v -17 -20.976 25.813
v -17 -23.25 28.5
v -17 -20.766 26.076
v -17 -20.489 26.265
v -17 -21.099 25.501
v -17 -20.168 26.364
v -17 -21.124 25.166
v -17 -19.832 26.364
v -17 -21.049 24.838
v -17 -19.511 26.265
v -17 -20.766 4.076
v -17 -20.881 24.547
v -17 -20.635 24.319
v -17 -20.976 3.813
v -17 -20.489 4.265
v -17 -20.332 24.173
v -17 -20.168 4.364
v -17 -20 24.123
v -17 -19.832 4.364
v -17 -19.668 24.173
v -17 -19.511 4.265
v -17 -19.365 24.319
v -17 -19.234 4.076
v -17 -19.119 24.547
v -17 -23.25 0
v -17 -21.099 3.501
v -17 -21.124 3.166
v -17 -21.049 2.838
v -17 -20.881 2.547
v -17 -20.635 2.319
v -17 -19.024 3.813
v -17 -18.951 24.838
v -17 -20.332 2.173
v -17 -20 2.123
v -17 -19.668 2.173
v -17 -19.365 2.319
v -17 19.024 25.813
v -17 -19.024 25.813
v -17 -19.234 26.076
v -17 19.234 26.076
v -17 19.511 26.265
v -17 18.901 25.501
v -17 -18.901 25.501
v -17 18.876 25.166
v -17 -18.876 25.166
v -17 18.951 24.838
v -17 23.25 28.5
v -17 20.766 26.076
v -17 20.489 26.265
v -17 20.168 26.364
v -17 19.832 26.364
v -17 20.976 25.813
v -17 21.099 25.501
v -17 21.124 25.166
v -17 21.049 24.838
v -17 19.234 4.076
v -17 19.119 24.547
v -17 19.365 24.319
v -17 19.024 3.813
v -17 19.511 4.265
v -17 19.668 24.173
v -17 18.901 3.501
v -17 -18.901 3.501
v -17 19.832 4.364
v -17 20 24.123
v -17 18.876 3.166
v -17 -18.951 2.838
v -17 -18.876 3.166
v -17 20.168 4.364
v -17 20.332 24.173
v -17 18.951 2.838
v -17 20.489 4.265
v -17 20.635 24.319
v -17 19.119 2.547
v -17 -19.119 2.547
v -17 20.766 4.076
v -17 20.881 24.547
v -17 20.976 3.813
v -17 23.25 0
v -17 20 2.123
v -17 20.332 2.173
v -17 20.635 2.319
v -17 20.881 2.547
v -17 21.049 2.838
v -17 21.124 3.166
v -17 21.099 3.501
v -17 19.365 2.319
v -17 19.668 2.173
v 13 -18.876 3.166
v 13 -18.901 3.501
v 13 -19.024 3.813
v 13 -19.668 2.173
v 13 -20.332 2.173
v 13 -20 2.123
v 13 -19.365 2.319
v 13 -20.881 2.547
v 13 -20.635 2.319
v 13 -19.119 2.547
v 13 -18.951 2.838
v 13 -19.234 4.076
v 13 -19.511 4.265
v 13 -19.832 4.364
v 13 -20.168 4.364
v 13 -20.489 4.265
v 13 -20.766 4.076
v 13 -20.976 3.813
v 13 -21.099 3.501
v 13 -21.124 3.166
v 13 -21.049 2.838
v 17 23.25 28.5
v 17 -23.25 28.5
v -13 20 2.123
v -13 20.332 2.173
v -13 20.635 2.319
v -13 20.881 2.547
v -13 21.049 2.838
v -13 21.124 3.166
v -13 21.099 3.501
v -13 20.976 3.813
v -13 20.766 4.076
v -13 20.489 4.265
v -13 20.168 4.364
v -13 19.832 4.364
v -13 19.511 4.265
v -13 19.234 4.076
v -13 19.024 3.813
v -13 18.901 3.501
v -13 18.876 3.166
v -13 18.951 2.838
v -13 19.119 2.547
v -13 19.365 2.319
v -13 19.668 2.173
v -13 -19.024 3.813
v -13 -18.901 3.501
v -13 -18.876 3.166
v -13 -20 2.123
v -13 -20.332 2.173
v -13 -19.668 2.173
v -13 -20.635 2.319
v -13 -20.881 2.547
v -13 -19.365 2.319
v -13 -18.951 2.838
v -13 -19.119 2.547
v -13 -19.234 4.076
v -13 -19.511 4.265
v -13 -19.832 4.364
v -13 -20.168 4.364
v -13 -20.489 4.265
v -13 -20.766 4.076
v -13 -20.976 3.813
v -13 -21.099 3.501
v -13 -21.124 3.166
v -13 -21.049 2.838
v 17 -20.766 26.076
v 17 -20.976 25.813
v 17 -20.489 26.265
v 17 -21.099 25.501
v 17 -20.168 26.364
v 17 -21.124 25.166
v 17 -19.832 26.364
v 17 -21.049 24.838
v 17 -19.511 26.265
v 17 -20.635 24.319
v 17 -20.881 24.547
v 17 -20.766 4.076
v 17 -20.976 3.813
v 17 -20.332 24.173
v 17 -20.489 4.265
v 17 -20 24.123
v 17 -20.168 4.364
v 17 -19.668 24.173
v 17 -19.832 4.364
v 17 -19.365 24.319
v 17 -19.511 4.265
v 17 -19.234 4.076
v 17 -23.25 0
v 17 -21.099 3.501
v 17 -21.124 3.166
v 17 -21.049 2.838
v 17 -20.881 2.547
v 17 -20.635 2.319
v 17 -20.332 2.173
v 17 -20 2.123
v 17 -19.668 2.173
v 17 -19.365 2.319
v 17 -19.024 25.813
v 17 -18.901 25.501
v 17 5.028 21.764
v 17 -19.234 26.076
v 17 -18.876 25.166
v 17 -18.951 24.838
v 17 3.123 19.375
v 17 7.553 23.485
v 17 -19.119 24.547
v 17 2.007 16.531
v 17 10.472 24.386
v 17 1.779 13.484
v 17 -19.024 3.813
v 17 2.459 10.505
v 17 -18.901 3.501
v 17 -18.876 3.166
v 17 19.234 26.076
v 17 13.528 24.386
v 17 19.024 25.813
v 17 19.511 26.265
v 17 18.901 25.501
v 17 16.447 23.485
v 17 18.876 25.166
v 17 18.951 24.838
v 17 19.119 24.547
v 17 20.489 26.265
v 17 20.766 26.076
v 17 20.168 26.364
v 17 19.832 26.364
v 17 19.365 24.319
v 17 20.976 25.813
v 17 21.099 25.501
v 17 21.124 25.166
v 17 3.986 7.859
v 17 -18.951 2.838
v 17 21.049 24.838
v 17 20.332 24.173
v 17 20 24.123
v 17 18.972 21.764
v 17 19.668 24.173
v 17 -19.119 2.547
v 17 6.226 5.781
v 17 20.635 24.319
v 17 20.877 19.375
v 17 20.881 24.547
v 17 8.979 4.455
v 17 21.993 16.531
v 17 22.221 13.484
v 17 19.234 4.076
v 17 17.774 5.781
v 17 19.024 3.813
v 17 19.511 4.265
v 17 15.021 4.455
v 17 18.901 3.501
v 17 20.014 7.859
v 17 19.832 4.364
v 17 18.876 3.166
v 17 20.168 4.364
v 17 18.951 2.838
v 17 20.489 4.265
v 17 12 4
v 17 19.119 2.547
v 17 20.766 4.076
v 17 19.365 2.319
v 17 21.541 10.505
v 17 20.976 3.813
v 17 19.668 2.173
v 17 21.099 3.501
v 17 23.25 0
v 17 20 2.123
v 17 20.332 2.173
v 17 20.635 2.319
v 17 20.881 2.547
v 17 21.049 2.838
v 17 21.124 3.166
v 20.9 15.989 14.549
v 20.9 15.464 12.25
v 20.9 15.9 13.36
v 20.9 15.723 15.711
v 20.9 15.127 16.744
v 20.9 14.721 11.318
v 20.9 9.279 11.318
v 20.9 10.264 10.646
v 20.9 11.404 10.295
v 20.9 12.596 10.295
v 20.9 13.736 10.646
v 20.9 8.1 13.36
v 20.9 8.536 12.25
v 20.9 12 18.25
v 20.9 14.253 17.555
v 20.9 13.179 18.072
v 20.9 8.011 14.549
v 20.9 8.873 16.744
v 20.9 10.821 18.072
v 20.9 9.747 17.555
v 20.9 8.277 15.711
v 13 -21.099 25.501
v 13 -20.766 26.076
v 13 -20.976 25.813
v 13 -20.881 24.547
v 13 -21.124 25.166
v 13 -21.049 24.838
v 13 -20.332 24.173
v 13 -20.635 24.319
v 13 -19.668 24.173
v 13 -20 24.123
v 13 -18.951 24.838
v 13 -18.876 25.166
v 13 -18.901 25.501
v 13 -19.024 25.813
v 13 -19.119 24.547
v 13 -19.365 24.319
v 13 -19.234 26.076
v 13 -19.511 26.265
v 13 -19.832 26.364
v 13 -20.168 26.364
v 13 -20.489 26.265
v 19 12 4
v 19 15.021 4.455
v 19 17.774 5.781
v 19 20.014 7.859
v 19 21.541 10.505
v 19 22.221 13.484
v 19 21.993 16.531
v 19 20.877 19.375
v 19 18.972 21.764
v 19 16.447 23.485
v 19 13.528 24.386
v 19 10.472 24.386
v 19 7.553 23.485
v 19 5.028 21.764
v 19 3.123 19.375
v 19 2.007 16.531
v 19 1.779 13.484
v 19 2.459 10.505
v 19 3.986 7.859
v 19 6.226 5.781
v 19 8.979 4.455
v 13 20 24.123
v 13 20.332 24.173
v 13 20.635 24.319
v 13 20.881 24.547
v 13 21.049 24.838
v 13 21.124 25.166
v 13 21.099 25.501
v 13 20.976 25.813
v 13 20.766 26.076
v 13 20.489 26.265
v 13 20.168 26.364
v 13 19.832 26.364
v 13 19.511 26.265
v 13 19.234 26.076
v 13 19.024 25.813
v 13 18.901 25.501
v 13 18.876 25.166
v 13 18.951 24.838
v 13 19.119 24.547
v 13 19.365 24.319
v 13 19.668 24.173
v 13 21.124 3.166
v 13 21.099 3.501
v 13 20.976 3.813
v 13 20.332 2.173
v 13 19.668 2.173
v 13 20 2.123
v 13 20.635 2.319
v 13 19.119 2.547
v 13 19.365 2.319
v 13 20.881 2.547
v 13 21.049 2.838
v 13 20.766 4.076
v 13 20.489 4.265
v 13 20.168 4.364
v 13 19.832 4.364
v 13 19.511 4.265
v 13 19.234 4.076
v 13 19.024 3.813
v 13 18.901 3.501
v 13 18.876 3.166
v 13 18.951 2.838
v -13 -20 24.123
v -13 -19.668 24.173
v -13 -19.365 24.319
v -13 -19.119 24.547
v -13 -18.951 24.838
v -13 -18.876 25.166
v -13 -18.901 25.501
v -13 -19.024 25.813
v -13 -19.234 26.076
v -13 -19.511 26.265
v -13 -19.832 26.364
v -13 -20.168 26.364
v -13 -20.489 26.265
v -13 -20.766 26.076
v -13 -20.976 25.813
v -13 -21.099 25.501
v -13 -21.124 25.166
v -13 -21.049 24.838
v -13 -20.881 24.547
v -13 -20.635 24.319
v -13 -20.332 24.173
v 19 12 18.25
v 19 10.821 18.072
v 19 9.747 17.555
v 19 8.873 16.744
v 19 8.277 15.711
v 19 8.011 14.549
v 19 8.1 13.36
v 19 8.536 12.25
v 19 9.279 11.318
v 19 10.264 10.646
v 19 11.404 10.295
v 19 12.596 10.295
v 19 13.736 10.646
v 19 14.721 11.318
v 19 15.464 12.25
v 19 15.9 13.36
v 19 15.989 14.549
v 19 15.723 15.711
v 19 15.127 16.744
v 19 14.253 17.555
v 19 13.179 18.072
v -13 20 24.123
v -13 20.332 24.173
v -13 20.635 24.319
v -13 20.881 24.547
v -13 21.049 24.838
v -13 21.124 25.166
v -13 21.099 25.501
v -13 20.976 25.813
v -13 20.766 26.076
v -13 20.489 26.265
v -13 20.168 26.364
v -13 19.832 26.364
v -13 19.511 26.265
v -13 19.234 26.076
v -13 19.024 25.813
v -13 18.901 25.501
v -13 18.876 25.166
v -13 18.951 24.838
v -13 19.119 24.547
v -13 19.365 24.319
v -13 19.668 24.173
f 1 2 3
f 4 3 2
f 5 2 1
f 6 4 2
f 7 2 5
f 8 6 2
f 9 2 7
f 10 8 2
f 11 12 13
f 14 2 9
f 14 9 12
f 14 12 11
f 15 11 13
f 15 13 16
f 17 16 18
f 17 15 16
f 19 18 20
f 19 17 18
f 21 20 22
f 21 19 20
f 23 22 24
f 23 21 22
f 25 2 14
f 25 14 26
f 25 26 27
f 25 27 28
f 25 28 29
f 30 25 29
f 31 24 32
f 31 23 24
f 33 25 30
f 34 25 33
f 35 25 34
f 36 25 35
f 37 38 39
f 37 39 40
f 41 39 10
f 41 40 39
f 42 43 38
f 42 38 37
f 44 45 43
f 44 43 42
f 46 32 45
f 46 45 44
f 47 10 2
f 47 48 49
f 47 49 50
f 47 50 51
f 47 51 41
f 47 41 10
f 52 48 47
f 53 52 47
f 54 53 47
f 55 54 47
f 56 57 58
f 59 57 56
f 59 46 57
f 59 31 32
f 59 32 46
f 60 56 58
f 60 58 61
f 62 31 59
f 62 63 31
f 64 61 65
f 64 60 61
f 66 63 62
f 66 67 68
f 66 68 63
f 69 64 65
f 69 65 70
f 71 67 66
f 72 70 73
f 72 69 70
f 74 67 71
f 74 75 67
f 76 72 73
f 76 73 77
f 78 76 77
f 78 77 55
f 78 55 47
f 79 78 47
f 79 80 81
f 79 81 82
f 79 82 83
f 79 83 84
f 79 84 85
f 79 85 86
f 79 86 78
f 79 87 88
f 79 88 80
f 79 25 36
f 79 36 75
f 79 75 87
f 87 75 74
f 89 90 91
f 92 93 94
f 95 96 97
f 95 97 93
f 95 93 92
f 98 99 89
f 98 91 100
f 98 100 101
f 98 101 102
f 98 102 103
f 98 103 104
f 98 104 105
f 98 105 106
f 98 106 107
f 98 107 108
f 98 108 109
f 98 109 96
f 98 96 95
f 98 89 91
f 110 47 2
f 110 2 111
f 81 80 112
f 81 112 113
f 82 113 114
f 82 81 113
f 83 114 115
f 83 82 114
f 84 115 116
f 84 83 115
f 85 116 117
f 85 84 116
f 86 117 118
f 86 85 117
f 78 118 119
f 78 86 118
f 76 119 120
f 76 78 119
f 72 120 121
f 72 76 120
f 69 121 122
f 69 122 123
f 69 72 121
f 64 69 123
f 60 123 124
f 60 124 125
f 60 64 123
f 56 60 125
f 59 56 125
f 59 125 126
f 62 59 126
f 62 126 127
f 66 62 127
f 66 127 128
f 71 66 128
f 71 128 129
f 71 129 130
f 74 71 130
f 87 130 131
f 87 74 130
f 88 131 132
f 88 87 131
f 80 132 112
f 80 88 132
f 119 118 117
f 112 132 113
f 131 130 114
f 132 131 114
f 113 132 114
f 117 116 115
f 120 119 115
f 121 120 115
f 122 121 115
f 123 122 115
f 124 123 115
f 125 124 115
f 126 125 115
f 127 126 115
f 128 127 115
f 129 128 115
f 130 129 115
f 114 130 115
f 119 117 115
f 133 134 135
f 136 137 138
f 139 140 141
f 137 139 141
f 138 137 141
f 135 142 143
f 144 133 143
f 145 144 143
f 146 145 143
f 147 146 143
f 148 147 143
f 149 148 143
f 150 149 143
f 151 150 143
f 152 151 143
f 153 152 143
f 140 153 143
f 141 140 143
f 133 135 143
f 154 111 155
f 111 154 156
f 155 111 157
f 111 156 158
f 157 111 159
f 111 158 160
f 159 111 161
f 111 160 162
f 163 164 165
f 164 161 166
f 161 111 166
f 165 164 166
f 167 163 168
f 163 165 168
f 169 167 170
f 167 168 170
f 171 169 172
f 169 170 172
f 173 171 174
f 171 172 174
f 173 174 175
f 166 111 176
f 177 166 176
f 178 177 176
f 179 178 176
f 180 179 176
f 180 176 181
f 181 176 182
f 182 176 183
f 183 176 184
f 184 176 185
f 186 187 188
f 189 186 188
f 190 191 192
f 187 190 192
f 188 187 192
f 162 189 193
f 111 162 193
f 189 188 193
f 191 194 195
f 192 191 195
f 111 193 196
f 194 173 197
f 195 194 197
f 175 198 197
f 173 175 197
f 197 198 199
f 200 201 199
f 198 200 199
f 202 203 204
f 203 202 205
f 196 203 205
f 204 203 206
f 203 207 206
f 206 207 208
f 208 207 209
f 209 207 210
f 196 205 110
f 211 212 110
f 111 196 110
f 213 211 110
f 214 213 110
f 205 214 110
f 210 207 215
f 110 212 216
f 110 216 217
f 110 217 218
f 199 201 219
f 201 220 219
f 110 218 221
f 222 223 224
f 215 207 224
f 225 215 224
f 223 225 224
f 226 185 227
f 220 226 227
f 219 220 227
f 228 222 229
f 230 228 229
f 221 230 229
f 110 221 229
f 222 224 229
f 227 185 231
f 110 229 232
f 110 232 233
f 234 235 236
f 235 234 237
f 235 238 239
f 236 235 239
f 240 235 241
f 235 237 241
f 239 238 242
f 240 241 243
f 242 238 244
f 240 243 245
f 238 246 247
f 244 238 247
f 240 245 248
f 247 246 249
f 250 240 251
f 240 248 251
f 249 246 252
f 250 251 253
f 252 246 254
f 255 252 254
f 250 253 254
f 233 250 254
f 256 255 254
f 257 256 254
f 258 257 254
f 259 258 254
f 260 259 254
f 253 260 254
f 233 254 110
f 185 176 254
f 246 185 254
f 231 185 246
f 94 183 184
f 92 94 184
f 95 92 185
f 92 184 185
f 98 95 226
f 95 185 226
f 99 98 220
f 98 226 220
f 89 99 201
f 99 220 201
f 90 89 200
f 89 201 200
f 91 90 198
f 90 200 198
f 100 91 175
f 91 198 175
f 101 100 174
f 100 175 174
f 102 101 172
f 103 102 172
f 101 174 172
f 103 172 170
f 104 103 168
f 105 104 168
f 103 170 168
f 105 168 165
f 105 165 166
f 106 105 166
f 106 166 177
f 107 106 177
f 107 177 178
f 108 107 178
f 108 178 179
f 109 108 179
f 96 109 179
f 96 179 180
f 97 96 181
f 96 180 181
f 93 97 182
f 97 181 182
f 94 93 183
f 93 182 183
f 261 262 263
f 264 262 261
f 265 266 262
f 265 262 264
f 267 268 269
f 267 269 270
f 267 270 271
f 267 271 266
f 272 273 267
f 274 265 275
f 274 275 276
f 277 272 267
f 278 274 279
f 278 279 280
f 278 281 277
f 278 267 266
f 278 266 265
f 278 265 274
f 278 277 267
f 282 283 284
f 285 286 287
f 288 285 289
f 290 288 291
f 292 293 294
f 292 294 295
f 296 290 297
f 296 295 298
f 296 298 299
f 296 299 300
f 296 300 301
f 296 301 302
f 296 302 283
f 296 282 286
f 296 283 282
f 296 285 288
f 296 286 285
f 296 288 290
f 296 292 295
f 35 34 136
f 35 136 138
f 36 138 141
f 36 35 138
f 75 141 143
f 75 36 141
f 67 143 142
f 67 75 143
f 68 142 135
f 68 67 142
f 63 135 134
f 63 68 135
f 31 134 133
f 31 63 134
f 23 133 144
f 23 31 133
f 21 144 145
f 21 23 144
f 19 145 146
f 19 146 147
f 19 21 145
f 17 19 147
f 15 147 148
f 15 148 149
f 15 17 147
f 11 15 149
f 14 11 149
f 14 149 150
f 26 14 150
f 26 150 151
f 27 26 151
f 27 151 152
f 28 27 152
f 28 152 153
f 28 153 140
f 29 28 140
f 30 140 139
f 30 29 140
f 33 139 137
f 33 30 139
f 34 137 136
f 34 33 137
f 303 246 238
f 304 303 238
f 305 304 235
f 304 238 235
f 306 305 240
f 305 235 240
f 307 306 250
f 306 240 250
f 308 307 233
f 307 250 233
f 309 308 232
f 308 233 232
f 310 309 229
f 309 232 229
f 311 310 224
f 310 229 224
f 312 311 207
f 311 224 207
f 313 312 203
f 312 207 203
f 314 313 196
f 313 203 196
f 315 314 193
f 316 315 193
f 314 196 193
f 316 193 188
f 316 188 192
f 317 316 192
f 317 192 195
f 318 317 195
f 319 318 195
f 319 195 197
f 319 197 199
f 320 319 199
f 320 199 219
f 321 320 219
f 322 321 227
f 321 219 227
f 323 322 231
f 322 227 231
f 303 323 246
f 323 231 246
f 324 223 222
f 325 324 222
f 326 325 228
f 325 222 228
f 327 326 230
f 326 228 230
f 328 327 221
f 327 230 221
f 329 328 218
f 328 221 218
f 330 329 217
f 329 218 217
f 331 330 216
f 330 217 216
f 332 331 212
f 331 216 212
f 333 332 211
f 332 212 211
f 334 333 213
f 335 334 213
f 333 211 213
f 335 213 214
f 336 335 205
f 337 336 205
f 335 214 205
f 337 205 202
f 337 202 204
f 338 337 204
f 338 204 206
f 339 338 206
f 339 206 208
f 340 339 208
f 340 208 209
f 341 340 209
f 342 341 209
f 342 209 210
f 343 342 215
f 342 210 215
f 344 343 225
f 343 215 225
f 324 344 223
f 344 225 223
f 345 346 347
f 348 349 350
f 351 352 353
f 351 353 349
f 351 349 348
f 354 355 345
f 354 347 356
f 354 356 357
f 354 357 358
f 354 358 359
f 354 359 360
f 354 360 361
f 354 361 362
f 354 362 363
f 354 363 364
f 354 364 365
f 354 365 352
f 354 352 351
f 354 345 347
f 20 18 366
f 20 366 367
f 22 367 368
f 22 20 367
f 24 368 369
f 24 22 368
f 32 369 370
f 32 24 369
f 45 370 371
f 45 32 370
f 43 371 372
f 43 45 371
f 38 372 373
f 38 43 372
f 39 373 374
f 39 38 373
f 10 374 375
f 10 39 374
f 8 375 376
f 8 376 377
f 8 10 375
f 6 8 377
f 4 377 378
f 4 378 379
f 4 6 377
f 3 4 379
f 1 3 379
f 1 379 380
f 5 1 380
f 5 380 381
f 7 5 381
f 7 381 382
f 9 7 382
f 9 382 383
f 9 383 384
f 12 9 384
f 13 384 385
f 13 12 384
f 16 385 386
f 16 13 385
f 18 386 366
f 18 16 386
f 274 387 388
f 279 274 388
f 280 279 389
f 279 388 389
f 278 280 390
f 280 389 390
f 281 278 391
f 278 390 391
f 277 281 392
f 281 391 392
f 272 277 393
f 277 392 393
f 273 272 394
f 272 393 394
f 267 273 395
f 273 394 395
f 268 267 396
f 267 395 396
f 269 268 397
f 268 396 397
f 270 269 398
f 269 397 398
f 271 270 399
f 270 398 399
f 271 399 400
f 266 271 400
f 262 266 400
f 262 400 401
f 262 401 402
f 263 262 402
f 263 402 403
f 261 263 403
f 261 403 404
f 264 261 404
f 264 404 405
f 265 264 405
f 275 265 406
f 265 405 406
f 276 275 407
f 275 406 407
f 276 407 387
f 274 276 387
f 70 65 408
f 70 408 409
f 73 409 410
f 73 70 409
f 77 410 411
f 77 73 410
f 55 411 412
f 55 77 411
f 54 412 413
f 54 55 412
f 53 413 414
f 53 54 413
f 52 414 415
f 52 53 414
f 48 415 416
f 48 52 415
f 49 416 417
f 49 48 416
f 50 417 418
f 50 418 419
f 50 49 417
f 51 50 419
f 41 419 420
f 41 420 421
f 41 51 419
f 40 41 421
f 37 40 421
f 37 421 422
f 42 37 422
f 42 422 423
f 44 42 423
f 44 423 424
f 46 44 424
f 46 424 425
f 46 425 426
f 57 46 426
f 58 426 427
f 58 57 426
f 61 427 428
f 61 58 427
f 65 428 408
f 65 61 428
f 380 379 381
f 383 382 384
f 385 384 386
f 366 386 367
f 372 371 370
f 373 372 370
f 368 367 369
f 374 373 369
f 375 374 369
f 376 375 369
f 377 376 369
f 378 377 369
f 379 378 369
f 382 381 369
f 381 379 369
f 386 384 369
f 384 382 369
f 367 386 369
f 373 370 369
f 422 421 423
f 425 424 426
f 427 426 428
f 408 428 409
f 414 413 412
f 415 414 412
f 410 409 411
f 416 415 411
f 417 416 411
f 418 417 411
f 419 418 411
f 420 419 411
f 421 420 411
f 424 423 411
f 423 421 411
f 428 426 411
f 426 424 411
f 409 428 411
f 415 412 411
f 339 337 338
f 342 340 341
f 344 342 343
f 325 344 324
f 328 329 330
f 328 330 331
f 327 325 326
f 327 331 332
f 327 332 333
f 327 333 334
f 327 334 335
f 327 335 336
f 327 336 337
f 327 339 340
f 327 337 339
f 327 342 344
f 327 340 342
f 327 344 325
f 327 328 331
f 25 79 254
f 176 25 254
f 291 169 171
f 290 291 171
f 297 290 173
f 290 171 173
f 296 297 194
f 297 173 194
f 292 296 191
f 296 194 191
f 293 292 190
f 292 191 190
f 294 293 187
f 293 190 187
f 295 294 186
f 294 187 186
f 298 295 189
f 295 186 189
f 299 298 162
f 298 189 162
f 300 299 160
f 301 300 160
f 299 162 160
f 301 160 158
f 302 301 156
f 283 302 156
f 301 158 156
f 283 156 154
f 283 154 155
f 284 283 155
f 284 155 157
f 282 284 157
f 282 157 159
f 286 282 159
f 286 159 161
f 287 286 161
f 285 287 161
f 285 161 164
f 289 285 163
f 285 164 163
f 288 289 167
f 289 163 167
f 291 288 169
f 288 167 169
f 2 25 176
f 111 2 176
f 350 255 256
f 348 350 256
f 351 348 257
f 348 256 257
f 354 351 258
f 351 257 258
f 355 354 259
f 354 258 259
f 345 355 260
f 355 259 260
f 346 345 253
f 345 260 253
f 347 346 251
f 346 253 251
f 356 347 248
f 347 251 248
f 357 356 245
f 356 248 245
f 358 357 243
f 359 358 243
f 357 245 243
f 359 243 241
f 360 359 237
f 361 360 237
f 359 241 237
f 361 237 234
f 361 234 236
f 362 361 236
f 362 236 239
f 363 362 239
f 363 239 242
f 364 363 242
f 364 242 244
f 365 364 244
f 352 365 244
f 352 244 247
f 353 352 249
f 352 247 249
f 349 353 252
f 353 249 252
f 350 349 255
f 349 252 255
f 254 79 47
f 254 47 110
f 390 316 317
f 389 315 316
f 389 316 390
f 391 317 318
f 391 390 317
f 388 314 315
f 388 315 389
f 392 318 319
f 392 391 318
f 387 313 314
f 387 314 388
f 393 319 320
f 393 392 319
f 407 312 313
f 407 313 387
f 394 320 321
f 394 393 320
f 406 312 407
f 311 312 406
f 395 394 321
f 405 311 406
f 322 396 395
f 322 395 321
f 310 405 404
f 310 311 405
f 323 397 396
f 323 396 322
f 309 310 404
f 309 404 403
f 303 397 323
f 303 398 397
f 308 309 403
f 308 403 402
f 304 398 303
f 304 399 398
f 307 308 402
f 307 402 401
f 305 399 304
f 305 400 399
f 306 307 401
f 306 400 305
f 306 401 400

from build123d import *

# Parameters (mm, degrees)
SKETCH1_W           = 34
SKETCH1_H           = 46.5
BOSS_EXTRUDE1_DEPTH = 28.5
SKETCH2_R           = 10.25
BOSS_EXTRUDE2_DEPTH = 2
SKETCH3_R           = 4
BOSS_EXTRUDE3_DEPTH = 1.9
SKETCH10_R          = 1.126890163
CUT_EXTRUDE2_DEPTH  = 4


with BuildPart() as part:
    # Sketch1 → Boss-Extrude1 (new body)
    with BuildSketch(Plane.XY):
        Rectangle(SKETCH1_W, SKETCH1_H)
    extrude(amount=BOSS_EXTRUDE1_DEPTH)

    # Sketch2 → Boss-Extrude2 (add)
    with BuildSketch(Plane(origin=(17, 0, 0), x_dir=(0, 0, -1), z_dir=(1, 0, 0))):
        with Locations((-14.25, 12)):
            Circle(SKETCH2_R)
    extrude(amount=BOSS_EXTRUDE2_DEPTH)

    # Sketch3 → Boss-Extrude3 (add)
    with BuildSketch(Plane(origin=(19, 0, 0), x_dir=(0, 0, -1), z_dir=(1, 0, 0))):
        with Locations(Location((-14.25, 12, 0), (0, 0, 180))):
            Circle(SKETCH3_R)
    extrude(amount=BOSS_EXTRUDE3_DEPTH)

    # Sketch10 → Cut-Extrude2 (cut)
    with BuildSketch(Plane(origin=(17, 0, 0), x_dir=(0, 0, -1), z_dir=(1, 0, 0))):
        with Locations((-3.25, 20)):
            Circle(SKETCH10_R)
        with Locations((-25.25, 20)):
            Circle(SKETCH10_R)
        with Locations((-25.25, -20)):
            Circle(SKETCH10_R)
        with Locations((-3.25, -20)):
            Circle(SKETCH10_R)
    cut_extrude2 = extrude(amount=-CUT_EXTRUDE2_DEPTH, mode=Mode.SUBTRACT)

    # Mirror1: Cut-Extrude2 across plane
    add(cut_extrude2.mirror(Plane(origin=(0, 0, 0), x_dir=(0, 0, 1), z_dir=(1, 0, 0))), mode=Mode.SUBTRACT)


solid = part.part
